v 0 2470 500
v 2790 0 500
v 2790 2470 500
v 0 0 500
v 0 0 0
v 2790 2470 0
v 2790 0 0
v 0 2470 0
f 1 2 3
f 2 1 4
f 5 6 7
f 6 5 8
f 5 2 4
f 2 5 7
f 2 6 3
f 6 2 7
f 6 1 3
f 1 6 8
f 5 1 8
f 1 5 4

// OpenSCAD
//tatami
//左下角原点
module tatami(){
cube([2790,2470,500]);

}
tatami(); 
